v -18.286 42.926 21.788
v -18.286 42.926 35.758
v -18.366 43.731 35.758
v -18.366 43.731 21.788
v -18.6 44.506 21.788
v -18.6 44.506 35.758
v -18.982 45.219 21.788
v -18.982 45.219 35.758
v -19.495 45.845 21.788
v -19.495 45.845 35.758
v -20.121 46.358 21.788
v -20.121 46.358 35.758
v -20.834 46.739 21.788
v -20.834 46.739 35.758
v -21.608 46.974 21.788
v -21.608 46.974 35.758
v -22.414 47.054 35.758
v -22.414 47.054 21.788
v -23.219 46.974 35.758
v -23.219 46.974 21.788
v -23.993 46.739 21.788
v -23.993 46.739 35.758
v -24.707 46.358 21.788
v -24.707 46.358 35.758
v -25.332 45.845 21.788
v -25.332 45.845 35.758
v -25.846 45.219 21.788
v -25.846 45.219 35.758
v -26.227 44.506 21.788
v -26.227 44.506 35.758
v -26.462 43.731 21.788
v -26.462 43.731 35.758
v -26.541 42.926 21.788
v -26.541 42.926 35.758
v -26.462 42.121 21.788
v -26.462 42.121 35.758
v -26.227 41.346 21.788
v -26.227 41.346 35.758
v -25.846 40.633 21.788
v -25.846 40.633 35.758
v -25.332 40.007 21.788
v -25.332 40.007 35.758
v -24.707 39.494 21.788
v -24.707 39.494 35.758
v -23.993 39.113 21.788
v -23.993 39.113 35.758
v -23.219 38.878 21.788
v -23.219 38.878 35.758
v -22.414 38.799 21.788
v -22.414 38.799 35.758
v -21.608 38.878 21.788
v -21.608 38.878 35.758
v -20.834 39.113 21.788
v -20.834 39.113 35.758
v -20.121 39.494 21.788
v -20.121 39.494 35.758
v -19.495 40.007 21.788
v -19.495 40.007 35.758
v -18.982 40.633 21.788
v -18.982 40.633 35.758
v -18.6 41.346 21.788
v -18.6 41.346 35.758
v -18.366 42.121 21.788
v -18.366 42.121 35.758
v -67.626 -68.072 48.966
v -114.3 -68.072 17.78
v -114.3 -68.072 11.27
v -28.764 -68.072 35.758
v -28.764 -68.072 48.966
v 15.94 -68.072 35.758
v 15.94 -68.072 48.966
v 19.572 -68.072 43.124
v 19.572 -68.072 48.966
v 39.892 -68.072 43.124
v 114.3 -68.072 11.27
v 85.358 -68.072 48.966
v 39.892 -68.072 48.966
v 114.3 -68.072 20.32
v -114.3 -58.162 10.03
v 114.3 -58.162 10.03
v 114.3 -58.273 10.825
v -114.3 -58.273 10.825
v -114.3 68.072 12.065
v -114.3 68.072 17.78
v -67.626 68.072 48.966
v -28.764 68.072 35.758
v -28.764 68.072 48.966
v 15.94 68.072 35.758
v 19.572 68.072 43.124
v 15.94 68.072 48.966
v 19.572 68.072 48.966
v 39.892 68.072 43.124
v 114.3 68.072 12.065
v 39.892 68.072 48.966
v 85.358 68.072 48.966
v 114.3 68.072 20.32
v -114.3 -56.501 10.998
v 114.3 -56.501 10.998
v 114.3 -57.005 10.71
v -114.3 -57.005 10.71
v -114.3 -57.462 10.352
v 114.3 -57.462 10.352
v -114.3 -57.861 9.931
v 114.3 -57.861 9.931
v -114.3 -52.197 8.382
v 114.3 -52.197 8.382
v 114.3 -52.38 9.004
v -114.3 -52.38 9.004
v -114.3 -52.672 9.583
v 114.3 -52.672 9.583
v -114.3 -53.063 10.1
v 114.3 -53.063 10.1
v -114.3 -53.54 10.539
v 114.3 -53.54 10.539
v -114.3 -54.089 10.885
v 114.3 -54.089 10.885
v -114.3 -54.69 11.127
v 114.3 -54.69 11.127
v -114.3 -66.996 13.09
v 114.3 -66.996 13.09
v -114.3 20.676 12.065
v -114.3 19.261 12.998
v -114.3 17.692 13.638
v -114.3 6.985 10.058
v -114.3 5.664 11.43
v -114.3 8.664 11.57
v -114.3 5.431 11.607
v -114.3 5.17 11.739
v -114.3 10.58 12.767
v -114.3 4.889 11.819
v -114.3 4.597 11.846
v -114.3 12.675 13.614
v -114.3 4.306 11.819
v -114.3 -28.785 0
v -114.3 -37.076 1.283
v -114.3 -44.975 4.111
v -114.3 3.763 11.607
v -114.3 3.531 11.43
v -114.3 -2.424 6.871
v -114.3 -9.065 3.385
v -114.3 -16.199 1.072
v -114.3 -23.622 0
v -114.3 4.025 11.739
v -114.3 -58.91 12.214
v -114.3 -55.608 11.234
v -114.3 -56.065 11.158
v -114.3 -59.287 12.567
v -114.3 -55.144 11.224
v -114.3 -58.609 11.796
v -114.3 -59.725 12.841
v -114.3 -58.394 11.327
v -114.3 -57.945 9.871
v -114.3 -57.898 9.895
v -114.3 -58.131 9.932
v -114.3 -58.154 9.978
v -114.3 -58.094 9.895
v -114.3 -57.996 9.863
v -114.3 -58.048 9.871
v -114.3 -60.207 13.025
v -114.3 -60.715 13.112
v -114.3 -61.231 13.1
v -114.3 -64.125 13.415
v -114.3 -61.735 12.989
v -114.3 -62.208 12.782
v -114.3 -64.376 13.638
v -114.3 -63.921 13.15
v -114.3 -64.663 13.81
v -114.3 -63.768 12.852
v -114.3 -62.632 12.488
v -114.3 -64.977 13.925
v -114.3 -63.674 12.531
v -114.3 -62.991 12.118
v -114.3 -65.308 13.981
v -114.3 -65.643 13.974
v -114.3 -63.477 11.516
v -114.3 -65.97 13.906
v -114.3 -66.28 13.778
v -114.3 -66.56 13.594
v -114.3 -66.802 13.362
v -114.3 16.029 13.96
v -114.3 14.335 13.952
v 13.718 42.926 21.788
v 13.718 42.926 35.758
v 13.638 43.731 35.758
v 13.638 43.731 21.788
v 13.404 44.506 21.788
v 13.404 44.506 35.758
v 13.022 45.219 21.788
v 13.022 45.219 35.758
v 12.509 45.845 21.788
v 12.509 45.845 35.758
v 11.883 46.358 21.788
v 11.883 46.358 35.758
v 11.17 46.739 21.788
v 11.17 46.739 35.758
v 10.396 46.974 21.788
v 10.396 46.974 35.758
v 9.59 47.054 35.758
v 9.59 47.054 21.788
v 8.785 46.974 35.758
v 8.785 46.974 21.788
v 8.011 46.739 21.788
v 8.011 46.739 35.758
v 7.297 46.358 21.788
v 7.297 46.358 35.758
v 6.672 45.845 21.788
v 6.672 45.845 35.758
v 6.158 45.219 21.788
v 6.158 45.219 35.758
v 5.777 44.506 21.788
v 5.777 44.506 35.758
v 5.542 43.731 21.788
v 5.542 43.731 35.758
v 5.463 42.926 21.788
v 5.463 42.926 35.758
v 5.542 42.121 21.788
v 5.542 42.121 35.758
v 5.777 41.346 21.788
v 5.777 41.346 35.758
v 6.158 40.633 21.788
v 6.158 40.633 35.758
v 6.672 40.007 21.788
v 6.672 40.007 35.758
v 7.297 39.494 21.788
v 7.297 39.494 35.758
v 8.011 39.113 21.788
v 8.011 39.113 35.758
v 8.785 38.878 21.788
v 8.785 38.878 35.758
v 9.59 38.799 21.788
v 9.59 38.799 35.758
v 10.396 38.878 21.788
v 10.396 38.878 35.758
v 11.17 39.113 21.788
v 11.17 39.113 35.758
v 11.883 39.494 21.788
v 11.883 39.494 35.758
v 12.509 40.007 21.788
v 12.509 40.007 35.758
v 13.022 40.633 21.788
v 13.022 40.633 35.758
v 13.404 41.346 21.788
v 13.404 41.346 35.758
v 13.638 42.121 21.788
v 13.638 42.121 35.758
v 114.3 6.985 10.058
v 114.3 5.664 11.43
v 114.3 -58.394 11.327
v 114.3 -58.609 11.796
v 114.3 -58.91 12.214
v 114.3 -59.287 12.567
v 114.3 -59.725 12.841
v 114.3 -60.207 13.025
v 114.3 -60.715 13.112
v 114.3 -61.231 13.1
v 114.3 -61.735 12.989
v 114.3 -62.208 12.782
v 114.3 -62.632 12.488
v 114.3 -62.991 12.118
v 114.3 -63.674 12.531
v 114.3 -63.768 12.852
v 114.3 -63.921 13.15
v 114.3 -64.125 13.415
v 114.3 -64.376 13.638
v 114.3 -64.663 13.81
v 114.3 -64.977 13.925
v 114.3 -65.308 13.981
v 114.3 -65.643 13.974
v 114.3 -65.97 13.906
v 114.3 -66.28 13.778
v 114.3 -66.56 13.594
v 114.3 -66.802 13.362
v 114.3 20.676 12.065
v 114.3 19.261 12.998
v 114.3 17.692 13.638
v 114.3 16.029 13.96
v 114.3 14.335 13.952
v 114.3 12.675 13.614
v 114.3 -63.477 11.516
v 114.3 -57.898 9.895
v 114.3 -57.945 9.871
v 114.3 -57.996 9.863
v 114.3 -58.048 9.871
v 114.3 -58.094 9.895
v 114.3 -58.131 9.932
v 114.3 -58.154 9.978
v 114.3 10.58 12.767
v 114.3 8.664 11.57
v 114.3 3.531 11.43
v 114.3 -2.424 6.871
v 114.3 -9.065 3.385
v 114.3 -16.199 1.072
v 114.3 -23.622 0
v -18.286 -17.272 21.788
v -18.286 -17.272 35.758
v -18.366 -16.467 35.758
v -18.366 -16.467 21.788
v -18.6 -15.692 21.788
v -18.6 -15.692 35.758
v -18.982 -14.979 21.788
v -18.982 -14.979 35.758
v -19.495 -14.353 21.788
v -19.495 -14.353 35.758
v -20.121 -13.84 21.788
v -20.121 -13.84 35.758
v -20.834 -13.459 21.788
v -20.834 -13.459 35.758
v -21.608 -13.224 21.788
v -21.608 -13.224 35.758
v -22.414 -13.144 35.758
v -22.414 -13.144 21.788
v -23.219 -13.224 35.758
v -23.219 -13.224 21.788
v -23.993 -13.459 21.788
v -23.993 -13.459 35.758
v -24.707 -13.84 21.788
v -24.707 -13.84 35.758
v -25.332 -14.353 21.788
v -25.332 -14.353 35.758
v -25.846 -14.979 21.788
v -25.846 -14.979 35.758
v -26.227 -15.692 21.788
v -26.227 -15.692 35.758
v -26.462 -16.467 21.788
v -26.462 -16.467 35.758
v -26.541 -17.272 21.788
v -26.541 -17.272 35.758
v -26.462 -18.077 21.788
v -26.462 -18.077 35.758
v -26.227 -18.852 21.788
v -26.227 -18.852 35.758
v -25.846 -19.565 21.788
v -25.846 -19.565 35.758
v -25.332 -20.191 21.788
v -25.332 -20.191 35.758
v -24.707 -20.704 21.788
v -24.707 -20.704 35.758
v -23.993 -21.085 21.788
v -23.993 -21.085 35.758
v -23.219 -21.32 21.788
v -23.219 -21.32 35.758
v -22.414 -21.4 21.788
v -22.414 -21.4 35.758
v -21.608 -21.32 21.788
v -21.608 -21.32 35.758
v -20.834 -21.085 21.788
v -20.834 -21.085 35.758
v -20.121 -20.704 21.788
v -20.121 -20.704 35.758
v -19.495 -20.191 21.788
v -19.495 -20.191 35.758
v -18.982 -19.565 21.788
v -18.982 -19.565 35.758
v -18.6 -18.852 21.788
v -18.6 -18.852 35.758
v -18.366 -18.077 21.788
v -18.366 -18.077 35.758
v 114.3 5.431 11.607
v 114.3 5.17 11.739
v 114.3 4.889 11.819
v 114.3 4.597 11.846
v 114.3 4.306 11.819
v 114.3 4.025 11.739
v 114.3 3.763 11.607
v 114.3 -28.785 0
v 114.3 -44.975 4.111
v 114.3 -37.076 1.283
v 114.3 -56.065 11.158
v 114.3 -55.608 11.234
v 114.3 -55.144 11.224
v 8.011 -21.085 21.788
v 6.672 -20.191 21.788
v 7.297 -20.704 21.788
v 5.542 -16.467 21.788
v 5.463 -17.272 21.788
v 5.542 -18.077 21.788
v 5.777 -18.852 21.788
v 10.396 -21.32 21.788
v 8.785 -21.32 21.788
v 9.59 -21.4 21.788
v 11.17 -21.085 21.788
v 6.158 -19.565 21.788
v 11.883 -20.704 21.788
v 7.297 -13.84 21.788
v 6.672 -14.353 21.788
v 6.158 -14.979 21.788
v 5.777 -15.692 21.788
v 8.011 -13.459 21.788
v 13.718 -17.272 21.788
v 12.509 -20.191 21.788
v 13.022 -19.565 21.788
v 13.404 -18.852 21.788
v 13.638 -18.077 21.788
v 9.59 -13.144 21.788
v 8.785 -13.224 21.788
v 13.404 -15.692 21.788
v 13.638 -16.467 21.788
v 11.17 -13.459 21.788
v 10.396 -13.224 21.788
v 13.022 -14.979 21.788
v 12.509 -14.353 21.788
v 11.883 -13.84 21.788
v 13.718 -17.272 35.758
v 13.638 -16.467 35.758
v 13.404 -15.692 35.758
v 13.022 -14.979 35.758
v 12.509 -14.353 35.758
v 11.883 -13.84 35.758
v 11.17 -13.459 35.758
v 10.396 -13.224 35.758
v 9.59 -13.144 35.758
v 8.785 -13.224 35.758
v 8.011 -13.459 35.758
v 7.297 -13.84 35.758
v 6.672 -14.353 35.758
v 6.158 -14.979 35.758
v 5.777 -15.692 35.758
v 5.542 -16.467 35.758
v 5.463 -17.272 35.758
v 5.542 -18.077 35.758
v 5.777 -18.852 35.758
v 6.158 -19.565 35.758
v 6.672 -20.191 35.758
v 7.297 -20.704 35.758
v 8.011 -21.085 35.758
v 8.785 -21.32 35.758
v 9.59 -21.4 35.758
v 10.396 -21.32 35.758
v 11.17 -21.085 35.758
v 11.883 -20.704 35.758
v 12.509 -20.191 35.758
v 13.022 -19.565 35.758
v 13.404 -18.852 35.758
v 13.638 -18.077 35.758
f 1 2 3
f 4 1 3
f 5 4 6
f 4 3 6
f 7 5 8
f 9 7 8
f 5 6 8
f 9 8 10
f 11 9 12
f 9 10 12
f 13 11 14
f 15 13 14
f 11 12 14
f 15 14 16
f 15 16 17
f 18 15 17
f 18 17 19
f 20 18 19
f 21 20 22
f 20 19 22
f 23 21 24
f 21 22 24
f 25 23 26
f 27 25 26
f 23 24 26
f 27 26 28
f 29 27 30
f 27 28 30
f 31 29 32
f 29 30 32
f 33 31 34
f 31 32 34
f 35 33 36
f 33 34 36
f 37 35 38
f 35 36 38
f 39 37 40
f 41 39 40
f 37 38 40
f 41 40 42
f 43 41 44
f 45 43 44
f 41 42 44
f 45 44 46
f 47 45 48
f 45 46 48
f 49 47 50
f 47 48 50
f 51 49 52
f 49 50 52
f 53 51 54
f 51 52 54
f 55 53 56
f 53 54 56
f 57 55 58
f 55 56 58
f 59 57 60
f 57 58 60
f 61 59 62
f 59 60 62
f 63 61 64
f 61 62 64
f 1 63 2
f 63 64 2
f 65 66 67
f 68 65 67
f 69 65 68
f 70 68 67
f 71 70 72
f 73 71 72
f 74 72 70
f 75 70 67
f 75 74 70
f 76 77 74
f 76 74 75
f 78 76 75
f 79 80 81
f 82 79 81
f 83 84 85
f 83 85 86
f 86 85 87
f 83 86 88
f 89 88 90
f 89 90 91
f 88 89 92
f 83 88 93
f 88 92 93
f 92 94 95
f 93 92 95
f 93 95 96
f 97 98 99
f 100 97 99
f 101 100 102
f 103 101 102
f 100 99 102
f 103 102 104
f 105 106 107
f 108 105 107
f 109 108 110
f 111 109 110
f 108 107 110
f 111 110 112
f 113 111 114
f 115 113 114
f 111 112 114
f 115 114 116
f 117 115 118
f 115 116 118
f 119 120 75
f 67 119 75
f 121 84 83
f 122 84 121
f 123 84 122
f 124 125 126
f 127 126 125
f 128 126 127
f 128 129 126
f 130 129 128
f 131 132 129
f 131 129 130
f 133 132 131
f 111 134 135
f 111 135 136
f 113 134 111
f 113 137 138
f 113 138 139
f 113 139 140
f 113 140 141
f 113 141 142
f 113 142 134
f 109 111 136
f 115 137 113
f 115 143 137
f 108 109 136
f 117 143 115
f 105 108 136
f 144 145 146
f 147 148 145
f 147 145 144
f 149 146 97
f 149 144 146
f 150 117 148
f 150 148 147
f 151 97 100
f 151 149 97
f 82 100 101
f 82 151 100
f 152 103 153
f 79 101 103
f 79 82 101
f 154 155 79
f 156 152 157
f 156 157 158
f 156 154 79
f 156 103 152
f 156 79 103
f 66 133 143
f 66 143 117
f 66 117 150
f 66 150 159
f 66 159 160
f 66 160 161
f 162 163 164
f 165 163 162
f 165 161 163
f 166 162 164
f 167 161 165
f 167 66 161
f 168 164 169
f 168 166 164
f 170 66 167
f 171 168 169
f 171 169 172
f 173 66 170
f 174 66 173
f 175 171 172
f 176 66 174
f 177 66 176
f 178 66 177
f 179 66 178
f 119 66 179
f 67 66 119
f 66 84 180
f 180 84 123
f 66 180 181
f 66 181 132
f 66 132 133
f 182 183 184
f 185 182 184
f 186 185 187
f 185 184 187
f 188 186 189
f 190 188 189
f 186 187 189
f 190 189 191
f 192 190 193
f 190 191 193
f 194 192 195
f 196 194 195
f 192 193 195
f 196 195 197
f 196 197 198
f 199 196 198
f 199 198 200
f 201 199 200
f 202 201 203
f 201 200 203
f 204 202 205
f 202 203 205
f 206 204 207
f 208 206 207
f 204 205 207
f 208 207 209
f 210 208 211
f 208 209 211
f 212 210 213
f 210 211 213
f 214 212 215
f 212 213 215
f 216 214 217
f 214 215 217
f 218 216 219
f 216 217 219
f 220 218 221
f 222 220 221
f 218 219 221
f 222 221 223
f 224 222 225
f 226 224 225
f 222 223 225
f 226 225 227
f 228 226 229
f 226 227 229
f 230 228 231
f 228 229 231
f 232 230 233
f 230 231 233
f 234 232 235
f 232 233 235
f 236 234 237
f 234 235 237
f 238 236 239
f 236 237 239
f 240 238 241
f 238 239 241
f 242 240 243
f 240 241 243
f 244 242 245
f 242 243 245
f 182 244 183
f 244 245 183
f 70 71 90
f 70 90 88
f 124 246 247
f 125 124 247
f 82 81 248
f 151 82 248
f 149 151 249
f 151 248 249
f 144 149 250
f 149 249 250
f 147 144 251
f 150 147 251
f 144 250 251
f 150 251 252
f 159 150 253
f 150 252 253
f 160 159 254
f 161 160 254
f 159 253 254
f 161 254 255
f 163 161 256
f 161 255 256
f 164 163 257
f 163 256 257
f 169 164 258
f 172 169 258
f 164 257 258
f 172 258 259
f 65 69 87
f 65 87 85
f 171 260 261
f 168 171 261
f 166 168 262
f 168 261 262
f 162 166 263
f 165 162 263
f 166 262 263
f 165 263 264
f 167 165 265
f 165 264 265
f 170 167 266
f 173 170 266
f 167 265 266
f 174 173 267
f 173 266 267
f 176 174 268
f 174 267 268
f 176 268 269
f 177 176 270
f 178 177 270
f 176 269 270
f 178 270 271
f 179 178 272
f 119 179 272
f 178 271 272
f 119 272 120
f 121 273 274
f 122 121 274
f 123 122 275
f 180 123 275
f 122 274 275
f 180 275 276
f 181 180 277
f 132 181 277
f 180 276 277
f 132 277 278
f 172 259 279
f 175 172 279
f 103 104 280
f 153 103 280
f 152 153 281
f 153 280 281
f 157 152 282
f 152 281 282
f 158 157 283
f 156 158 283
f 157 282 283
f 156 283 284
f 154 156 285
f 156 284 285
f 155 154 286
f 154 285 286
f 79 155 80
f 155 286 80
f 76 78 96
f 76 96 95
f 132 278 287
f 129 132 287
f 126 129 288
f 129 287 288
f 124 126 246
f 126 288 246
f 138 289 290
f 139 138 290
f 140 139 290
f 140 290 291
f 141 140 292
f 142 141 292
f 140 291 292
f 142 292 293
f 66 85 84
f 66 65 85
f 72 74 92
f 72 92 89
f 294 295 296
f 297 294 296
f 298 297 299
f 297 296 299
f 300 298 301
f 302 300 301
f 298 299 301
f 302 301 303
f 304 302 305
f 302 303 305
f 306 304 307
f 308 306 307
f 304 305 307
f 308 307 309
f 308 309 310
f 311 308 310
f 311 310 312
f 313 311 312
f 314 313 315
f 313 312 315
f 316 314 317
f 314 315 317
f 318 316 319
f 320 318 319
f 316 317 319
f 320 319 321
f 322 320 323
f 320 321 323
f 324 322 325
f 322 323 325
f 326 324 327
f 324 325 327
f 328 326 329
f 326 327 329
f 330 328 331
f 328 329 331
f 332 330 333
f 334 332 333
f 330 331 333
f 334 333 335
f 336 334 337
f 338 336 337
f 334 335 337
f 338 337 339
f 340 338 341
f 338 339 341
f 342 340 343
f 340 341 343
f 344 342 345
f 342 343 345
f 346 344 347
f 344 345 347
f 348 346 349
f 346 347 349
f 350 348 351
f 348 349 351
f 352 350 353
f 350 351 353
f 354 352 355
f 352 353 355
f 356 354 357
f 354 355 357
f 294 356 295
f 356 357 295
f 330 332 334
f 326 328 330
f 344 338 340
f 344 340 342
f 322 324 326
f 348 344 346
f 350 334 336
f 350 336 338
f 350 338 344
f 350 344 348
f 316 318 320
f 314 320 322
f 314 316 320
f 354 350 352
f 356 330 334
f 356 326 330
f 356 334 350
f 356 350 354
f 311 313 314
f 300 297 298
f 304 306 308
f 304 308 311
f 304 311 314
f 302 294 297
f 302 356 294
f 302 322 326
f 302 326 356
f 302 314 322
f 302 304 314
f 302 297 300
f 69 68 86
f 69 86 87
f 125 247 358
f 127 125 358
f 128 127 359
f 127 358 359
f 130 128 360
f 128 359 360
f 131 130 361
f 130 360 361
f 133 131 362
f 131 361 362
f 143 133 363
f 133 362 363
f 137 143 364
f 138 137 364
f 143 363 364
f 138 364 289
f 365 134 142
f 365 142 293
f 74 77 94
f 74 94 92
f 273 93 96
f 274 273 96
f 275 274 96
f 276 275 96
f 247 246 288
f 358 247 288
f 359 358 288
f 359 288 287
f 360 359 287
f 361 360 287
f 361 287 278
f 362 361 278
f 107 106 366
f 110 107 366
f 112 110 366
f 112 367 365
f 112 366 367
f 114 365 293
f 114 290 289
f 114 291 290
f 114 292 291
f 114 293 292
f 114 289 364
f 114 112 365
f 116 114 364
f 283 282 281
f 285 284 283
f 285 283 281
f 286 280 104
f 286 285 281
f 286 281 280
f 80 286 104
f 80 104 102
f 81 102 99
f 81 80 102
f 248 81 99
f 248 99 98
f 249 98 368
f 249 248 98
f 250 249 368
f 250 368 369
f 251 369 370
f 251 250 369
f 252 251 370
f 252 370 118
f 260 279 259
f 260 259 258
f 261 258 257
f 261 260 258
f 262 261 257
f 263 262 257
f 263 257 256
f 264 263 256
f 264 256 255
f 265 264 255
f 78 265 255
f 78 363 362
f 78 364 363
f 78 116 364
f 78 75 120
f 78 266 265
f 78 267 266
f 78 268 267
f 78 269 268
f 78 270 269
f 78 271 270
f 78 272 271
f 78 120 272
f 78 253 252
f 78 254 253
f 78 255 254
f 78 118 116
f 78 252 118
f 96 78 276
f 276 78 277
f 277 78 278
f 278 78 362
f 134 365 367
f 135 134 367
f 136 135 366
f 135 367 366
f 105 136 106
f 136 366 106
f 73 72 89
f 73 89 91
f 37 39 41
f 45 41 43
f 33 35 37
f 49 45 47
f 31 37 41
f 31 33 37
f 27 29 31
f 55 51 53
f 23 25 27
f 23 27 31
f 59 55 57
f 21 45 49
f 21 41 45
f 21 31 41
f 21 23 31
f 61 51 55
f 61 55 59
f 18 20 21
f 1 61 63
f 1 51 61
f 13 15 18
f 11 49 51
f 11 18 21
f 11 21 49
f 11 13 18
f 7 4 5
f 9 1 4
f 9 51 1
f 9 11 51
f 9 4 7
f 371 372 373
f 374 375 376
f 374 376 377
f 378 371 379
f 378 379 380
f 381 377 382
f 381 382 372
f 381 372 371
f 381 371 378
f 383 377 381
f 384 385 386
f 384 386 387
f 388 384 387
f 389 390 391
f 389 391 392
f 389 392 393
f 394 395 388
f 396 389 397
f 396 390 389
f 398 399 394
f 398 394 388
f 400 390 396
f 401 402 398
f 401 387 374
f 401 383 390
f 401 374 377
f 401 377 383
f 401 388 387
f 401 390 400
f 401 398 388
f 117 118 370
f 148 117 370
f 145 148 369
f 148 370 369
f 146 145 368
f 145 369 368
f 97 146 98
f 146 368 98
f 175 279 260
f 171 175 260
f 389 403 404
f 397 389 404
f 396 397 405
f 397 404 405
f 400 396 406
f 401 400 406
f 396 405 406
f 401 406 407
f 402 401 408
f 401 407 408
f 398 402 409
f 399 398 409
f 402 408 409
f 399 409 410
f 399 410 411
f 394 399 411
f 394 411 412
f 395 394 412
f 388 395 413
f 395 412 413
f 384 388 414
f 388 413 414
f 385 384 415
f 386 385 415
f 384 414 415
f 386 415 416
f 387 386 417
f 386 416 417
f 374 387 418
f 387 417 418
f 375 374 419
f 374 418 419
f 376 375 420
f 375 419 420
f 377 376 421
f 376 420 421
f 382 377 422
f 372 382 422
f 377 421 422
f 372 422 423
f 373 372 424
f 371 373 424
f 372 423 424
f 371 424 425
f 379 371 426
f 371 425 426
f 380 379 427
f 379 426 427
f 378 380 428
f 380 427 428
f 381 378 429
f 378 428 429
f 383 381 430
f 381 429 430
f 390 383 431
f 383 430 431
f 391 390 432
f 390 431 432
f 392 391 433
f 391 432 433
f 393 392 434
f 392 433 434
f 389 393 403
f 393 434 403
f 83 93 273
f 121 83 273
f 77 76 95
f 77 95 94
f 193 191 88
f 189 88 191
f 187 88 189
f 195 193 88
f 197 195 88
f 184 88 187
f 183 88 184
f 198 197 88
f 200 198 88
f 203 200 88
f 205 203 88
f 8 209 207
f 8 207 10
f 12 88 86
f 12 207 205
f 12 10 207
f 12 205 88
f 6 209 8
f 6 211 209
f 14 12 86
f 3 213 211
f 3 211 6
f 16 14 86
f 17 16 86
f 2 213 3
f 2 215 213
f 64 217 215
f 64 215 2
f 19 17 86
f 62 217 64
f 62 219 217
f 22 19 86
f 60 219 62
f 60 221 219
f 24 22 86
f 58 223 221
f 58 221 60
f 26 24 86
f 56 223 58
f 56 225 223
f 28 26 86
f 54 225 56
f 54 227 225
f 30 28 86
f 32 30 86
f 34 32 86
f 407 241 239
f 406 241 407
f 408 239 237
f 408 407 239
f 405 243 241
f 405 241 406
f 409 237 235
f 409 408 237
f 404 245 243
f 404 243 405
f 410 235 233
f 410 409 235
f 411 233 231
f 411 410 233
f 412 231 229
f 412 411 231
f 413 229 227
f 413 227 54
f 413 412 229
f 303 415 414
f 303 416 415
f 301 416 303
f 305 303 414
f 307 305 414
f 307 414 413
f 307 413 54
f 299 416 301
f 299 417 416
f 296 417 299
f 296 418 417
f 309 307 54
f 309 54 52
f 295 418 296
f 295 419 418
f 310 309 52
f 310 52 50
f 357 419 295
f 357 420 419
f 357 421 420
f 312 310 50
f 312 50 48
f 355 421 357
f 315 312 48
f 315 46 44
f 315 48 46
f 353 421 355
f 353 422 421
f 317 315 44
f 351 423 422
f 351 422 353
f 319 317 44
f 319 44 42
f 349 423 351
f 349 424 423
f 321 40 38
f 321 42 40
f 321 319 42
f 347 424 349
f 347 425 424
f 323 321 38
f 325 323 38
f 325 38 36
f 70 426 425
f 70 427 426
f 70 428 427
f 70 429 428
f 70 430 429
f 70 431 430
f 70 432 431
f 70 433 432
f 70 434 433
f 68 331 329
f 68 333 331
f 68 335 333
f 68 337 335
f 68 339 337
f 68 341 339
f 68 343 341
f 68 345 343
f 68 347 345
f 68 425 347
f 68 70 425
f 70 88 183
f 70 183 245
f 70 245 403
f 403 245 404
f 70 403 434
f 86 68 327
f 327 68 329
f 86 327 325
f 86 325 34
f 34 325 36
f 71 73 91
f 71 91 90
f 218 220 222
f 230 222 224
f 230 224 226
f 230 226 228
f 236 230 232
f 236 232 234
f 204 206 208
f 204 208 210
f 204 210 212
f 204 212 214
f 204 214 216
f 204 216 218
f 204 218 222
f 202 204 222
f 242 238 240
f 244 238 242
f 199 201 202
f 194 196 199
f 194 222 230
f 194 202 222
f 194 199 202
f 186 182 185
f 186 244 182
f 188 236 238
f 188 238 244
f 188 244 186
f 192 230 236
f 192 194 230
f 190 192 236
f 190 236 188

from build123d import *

# Parameters (mm, degrees)
F1_DEPTH      = 68.072
F1_DEPTH_BACK = 68.072
F2_R          = 4.1275
F3_DEPTH      = 13.97
F5_DEPTH      = 228.6
F6_DEPTH      = 228.6


# Not quite as in the source:
# - a feature names something its author has since deleted; it is built from what else it names


with BuildPart() as f1:
    # F0 (on Front) → F1 (new body, two sides)
    with BuildSketch(Plane.XZ) as f1_sk:
        Polygon((-114.3, 0), (0, 0), (114.3, 0), (114.3, 20.32), (85.358465722, 48.9655555556), (39.892465722, 48.9655555556), (39.892465722, 43.1235555556), (19.572465722, 43.1235555556), (19.572465722, 48.9655555556), (15.940265722, 48.9655555556), (15.940265722, 35.7575555556), (-28.763734278, 35.7575555556), (-28.763734278, 48.9655555556), (-67.625734278, 48.9655555556), (-114.3, 17.78), align=None)
    extrude(amount=F1_DEPTH)
    extrude(f1_sk.sketch, amount=-F1_DEPTH_BACK)

    # F2 (on face) → F3 (cut)
    with BuildSketch(Plane.XY.offset(35.7575555556)):
        with Locations((-22.413734278, 42.926)):
            Circle(F2_R)
        with Locations((9.590265722, 42.926)):
            Circle(F2_R)
        with Locations((9.590265722, -17.272)):
            Circle(F2_R)
        with Locations((-22.413734278, -17.272)):
            Circle(F2_R)
    extrude(amount=-F3_DEPTH, mode=Mode.SUBTRACT)

    # F4 (on face) → F5 (cut)
    with BuildSketch(Plane.YZ.offset(114.3)):
        with BuildLine():
            ThreePointArc((-28.7846772927, 0), (-41.092836195, 2.5095205348), (-52.197, 8.382))
            ThreePointArc((-52.197, 8.382), (-53.0628215245, 10.1004124317), (-54.6900965273, 11.1273322254))
            ThreePointArc((-54.6900965273, 11.1273322254), (-55.6077664174, 11.233907182), (-56.5009973943, 10.9980795532))
            ThreePointArc((-56.5009973943, 10.9980795532), (-57.2399299218, 10.5397598563), (-57.8612, 9.9314))
            ThreePointArc((-57.8612, 9.9314), (-58.0475109479, 9.8713617946), (-58.1624396145, 10.0298160687))
            Line((-58.1624396145, 10.0298160687), (-58.2733862102, 10.82482934))
            ThreePointArc((-58.2733862102, 10.82482934), (-60.2066850368, 13.0247678359), (-62.9914626479, 12.1179120615))
            Line((-62.9914626479, 12.1179120615), (-63.4766221046, 11.5155344829))
            Line((-63.4766221046, 11.5155344829), (-63.6741071939, 12.5305661932))
            ThreePointArc((-63.6741071939, 12.5305661932), (-65.141327886, 13.96093331), (-66.995896399, 13.0895767361))
            Line((-66.995896399, 13.0895767361), (-68.072, 11.2702753395))
            Line((-68.072, 11.2702753395), (-68.072, 0))
            Line((-68.072, 0), (-28.7846772927, 0))
        make_face()
    extrude(amount=-F5_DEPTH, mode=Mode.SUBTRACT)

    # F4 (on face) → F6 (cut)
    with BuildSketch(Plane.YZ.offset(114.3)):
        with BuildLine():
            ThreePointArc((3.5306, 11.43), (-9.0647706891, 3.3847479258), (-23.622, 0))
            Line((-23.622, 0), (68.072, 0))
            Line((68.072, 0), (68.072, 12.065))
            Line((68.072, 12.065), (20.6756, 12.065))
            ThreePointArc((20.6756, 12.065), (16.8687140076, 13.8395100393), (12.6746, 13.6144))
            ThreePointArc((12.6746, 13.6144), (9.5960531105, 12.2103950232), (6.985, 10.0584))
            Line((6.985, 10.0584), (5.6642, 11.43))
            ThreePointArc((5.6642, 11.43), (4.5974, 11.8463817681), (3.5306, 11.43))
        make_face()
    extrude(amount=-F6_DEPTH, mode=Mode.SUBTRACT)


solid = f1.part
